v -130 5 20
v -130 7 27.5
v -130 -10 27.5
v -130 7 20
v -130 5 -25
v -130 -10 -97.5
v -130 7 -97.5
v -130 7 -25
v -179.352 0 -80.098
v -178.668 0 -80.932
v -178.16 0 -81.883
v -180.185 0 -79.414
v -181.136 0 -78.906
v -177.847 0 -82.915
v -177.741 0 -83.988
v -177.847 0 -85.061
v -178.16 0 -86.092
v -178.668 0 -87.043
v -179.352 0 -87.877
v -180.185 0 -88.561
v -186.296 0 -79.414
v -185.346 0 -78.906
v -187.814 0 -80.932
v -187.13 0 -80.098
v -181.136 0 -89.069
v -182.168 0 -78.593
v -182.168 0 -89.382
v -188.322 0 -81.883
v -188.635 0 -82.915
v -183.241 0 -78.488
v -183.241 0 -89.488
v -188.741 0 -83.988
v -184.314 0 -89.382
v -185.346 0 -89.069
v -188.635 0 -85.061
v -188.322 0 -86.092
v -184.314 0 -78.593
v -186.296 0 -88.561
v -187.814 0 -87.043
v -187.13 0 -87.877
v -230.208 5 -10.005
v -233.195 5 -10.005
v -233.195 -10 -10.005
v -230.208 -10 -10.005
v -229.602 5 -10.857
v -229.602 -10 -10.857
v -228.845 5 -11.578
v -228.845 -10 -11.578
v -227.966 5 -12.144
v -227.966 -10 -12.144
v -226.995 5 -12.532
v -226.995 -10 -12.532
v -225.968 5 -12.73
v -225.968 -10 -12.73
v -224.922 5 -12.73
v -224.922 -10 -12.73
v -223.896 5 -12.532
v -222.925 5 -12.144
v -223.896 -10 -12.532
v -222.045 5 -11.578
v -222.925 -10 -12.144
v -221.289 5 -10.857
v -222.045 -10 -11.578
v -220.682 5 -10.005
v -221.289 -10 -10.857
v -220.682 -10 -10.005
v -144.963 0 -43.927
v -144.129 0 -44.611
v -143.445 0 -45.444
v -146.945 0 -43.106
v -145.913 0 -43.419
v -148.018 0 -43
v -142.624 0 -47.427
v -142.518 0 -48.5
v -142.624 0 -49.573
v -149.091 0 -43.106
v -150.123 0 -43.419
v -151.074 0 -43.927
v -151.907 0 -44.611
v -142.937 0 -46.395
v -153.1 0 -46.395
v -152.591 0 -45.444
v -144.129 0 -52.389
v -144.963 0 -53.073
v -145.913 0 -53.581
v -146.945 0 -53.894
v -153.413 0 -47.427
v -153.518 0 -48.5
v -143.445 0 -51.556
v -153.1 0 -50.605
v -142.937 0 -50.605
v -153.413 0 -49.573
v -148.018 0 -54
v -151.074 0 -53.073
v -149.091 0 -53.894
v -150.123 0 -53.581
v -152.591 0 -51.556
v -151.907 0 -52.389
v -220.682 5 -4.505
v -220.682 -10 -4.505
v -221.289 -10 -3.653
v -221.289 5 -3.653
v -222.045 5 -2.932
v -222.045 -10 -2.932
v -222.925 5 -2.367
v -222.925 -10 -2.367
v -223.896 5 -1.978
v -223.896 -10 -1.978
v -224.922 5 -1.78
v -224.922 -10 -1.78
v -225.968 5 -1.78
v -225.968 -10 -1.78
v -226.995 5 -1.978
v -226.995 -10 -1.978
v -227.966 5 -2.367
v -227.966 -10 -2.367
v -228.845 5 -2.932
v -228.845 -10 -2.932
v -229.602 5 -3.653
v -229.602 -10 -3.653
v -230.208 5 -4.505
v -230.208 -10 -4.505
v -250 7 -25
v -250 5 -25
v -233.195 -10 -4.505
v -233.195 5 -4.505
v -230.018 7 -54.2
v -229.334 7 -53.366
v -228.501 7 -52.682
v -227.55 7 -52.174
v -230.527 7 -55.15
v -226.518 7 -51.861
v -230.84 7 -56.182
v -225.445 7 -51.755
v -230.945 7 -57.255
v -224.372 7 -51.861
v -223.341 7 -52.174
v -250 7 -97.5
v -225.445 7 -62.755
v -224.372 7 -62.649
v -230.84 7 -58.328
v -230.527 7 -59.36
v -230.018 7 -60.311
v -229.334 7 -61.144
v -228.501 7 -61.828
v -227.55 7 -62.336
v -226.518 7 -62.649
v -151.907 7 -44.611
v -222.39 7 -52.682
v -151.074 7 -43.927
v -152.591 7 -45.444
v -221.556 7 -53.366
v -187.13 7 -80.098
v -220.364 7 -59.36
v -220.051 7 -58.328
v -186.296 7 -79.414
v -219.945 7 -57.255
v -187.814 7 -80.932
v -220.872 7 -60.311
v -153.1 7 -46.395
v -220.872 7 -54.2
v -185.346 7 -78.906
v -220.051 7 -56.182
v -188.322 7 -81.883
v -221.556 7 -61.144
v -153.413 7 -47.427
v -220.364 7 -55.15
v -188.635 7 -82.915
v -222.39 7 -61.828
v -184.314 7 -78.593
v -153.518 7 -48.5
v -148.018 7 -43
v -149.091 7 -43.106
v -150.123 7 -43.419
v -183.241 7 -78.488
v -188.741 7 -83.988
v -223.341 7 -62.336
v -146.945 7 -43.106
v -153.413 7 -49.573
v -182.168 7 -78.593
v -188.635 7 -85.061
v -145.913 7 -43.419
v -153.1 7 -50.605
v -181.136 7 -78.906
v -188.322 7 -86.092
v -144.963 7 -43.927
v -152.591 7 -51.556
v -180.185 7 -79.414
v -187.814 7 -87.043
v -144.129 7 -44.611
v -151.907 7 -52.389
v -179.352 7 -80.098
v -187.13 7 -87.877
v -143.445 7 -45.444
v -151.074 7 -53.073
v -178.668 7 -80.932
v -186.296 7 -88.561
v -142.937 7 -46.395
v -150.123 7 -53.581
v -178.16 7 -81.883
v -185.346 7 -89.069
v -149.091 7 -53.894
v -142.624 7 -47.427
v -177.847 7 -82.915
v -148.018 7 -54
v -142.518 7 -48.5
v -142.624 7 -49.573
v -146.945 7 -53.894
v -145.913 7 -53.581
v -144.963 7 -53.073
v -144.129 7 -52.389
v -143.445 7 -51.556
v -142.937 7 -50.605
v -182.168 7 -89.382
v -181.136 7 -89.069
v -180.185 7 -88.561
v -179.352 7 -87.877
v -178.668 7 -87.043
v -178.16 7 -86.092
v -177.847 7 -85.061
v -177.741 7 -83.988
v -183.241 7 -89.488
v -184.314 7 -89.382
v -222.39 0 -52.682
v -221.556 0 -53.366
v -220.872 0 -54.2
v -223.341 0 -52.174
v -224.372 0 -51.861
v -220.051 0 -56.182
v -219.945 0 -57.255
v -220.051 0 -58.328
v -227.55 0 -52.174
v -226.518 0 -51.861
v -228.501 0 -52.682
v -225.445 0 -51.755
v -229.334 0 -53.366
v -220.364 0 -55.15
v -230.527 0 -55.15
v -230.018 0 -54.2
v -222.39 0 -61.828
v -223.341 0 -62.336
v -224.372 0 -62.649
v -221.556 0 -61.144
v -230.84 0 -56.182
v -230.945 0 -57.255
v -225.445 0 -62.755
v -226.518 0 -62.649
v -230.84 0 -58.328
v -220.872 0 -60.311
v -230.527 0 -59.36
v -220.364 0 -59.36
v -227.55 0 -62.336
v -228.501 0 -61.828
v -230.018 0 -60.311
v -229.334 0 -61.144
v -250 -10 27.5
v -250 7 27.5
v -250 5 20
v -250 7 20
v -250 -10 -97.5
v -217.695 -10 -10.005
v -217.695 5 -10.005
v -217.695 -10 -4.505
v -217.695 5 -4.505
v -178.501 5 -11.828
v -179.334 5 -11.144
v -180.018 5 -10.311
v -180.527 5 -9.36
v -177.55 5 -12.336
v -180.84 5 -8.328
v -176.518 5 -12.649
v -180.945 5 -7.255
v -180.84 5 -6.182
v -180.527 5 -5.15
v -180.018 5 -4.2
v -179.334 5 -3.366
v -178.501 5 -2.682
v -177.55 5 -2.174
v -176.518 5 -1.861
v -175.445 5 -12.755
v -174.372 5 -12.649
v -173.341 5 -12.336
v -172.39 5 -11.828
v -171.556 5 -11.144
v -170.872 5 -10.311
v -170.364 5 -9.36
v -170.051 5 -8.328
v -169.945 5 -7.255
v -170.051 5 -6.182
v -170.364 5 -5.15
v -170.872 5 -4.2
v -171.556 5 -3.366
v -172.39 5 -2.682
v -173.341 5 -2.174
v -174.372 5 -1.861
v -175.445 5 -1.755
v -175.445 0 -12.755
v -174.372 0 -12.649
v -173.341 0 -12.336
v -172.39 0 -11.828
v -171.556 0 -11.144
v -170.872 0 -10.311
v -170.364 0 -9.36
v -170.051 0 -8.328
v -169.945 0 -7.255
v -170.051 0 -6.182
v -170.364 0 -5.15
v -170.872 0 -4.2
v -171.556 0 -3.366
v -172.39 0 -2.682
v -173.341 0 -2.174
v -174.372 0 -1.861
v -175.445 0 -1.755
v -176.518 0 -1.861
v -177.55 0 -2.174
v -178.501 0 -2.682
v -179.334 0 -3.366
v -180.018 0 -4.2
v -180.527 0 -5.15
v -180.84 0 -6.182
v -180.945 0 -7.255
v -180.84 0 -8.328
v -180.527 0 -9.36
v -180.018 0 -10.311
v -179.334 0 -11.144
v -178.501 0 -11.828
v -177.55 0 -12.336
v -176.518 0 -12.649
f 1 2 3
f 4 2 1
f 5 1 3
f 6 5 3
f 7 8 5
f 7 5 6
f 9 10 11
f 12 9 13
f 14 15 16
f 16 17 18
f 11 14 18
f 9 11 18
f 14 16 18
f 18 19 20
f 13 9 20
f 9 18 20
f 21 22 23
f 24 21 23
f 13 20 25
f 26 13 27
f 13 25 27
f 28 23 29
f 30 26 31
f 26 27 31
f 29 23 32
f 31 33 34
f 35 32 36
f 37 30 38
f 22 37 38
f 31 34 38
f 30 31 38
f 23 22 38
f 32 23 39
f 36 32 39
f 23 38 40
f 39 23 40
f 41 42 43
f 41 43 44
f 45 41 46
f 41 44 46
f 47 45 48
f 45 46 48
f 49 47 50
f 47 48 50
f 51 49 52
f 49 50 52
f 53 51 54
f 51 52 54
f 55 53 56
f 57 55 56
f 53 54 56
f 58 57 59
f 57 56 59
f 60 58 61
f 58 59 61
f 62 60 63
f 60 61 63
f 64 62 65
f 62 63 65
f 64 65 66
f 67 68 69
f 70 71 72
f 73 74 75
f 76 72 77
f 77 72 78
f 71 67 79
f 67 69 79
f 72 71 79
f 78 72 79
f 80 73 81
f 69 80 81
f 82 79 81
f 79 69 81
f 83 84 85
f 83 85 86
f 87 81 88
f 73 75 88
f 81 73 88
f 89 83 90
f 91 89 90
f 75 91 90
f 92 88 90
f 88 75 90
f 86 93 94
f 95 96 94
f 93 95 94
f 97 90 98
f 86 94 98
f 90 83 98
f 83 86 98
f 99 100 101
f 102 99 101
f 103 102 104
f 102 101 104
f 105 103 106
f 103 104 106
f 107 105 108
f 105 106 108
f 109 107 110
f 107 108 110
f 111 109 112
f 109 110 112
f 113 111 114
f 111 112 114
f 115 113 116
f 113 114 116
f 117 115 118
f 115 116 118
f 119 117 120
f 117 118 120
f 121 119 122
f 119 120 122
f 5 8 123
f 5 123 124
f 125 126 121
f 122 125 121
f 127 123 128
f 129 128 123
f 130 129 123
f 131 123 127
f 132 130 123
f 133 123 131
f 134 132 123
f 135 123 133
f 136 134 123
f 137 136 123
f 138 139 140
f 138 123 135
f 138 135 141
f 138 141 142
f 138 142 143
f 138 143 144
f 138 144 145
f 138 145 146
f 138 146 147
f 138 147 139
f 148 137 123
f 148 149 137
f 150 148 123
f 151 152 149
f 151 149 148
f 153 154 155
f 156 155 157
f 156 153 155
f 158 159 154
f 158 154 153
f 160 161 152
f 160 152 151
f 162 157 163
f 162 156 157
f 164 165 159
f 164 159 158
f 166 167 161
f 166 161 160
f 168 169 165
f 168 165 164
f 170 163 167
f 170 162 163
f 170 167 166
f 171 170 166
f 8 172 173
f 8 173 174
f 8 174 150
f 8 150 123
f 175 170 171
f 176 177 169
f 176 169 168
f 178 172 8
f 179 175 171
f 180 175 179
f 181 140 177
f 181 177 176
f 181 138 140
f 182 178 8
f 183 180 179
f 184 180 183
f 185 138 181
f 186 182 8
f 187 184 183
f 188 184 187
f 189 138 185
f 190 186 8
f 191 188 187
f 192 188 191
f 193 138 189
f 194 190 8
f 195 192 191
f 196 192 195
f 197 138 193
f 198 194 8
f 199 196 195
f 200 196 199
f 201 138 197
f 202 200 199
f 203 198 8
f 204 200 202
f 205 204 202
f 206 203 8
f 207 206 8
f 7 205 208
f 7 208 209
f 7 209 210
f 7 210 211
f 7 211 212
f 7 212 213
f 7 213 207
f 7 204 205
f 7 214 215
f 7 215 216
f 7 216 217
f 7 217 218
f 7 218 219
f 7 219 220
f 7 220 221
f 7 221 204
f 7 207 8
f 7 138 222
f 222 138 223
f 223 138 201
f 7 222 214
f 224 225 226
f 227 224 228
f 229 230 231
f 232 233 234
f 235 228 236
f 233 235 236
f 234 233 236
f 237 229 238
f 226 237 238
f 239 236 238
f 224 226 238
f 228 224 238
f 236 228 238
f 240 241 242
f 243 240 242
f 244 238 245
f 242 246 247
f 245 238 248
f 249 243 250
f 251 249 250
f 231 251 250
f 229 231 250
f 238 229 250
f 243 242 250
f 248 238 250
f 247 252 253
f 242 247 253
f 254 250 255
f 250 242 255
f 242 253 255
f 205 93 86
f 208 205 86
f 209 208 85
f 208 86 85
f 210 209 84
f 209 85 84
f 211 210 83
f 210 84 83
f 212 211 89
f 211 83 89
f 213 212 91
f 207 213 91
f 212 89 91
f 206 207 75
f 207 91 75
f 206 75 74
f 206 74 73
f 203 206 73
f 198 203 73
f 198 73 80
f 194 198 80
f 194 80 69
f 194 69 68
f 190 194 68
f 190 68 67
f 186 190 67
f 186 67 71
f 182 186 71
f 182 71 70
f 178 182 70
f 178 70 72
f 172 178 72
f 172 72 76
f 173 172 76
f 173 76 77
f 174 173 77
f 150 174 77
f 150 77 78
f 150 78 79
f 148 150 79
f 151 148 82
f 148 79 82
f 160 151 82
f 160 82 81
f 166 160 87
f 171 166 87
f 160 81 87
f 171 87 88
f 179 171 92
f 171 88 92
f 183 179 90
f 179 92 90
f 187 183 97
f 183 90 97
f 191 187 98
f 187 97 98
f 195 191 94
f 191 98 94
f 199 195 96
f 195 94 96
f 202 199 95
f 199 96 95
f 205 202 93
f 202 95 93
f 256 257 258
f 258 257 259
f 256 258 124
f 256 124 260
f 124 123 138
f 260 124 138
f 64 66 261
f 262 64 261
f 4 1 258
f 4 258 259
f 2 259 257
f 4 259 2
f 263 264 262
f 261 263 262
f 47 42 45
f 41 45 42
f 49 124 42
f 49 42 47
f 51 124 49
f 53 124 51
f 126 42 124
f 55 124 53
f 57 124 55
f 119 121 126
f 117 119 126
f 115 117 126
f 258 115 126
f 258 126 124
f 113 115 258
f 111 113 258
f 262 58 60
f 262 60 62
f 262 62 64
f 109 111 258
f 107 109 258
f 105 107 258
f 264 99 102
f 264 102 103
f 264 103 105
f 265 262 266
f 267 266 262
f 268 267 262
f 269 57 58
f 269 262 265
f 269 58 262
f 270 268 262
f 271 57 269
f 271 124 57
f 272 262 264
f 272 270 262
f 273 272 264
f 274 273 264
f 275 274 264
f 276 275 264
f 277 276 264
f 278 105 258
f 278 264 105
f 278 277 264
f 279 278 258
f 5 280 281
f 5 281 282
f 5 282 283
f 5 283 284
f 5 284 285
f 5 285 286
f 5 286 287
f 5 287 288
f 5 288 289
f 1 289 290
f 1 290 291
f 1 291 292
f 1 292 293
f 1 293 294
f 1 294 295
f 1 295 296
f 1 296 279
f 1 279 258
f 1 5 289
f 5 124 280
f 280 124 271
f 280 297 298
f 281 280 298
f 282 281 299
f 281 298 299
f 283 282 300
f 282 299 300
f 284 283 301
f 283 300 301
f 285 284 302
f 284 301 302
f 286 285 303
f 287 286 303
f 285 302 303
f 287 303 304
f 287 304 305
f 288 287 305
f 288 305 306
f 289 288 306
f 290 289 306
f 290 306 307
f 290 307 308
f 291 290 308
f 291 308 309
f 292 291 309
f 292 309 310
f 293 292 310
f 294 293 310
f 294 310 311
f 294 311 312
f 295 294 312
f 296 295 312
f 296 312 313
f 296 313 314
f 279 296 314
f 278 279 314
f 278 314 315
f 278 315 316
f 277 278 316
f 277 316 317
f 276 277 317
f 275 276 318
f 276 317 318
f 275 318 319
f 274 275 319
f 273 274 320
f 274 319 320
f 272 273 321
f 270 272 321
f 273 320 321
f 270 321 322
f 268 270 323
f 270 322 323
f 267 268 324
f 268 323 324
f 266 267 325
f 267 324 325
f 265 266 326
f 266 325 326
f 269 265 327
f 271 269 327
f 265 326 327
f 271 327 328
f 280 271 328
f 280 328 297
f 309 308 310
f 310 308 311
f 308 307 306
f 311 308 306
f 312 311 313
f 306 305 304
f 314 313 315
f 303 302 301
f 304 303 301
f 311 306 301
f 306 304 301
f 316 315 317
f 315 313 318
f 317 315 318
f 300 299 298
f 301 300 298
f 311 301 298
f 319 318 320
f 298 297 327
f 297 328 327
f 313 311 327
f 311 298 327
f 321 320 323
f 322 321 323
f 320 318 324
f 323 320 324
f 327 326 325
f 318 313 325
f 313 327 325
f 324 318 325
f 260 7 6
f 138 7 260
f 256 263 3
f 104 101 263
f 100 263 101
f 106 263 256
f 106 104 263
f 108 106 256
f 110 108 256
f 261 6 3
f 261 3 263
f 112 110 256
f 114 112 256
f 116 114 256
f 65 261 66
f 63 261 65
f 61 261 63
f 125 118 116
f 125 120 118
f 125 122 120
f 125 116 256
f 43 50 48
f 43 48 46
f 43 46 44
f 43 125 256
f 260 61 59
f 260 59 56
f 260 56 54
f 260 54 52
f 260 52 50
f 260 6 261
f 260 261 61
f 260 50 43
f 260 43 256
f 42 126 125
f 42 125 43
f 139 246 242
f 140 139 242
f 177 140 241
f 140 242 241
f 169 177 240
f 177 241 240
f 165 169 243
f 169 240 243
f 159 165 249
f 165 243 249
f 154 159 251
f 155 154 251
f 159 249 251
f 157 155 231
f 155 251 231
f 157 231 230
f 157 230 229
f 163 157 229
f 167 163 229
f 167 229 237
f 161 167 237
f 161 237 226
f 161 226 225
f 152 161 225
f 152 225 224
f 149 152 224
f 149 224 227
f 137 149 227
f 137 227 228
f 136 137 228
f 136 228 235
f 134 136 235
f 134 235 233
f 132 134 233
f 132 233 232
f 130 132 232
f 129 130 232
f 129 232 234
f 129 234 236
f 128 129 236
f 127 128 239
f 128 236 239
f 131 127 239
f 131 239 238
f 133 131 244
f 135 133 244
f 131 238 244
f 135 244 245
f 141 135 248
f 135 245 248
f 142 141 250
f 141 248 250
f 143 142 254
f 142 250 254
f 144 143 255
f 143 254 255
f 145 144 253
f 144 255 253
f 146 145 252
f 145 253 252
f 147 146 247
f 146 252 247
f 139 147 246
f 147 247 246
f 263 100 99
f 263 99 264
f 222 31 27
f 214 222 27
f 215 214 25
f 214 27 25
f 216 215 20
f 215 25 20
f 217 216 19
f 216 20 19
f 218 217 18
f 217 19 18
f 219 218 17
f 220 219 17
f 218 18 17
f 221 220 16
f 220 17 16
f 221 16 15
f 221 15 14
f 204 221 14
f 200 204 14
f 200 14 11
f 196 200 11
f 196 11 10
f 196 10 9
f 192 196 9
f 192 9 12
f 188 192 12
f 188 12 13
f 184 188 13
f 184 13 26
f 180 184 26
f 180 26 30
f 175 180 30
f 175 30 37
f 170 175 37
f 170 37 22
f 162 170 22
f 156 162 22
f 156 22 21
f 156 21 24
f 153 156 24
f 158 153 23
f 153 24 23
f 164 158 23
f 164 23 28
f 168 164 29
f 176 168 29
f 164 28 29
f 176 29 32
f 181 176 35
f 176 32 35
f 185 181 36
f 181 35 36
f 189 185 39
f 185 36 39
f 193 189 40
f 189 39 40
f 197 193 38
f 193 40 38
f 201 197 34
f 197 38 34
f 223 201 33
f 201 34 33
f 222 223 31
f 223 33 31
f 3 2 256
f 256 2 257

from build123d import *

# Parameters (mm, degrees)
SKETCH1_W           = 120
SKETCH1_H           = 55
BOSS_EXTRUDE1_DEPTH = 5
SKETCH2_W           = 120
SKETCH2_H           = 7.5
BOSS_EXTRUDE2_DEPTH = 20
SKETCH3_W           = 120
SKETCH3_H           = 2.5
BOSS_EXTRUDE4_DEPTH = 20
BOSS_EXTRUDE5_DEPTH = 190
SKETCH9_W           = 310
SKETCH9_H           = 25
BOSS_EXTRUDE6_DEPTH = 70
SKETCH14_R          = 5.5
CUT_EXTRUDE5_DEPTH  = 153
SKETCH15_W          = 125
SKETCH15_H          = 25
CUT_EXTRUDE6_DEPTH  = 190
SKETCH16_W          = 120
SKETCH16_H          = 125
BOSS_EXTRUDE8_DEPTH = 10
SKETCH17_W          = 120
SKETCH17_H          = 125
CUT_EXTRUDE7_DEPTH  = 18
CUT_EXTRUDE8_START  = -31
SKETCH18_R          = 5.5
CUT_EXTRUDE8_DEPTH  = 31
SKETCH19_W          = 15.5
SKETCH19_H          = 5.5
CUT_EXTRUDE9_DEPTH  = 31


with BuildPart() as part:
    # Sketch1 → Boss-Extrude1 (new body)
    with BuildSketch(Plane(origin=(0, 0, 0), x_dir=(1, 0, 0), z_dir=(0, 1, 0))):
        Rectangle(SKETCH1_W, SKETCH1_H)
    extrude(amount=BOSS_EXTRUDE1_DEPTH)

    # Sketch2 → Boss-Extrude2 (add)
    with BuildSketch(Plane(origin=(0, 5, 0), x_dir=(1, 0, 0), z_dir=(0, 1, 0))):
        with Locations((0, -23.75)):
            Rectangle(SKETCH2_W, SKETCH2_H)
    extrude(amount=BOSS_EXTRUDE2_DEPTH)

    # Sketch3 → Boss-Extrude4 (add)
    with BuildSketch(Plane(origin=(0, 5, 0), x_dir=(1, 0, 0), z_dir=(0, 1, 0))):
        with Locations((0, 26.25)):
            Rectangle(SKETCH3_W, SKETCH3_H)
    extrude(amount=BOSS_EXTRUDE4_DEPTH)

    # Sketch8 → Boss-Extrude5 (add)
    with BuildSketch(Plane.ZY.offset(60)):
        Polygon((-27.5, 0), (-27.5, 25), (-25, 25), (-25, 5), (20, 5), (20, 25), (27.5, 25), (27.5, 0), align=None)
    extrude(amount=BOSS_EXTRUDE5_DEPTH)

    # Sketch9 → Boss-Extrude6 (add)
    with BuildSketch(Plane(origin=(0, 0, -27.5), x_dir=(-1, 0, 0), z_dir=(0, 0, -1))):
        with Locations((95, 12.5)):
            Rectangle(SKETCH9_W, SKETCH9_H)
    extrude(amount=BOSS_EXTRUDE6_DEPTH)

    # Sketch14 → Cut-Extrude5 (cut)
    with BuildSketch(Plane(origin=(0, 0, 0), x_dir=(-1, 0, 0), z_dir=(0, -1, 0))):
        with Locations(Location((225.445279058, 7.255161462, 0), (0, 0, 90))):
            Circle(SKETCH14_R)
        with Locations(Location((175.445279058, 7.255161462, 0), (0, 0, 90))):
            Circle(SKETCH14_R)
        with Locations(Location((225.445279058, 57.255161462, 0), (0, 0, 90))):
            Circle(SKETCH14_R)
        with Locations(Location((148.0182107, 48.5, 0), (0, 0, 90))):
            Circle(SKETCH14_R)
        with Locations(Location((183.240850763, 83.987541856, 0), (0, 0, 90))):
            Circle(SKETCH14_R)
    extrude(amount=-CUT_EXTRUDE5_DEPTH, mode=Mode.SUBTRACT)

    # Sketch15 → Cut-Extrude6 (cut)
    with BuildSketch(Plane(origin=(60, 0, 0), x_dir=(0, 0, -1), z_dir=(1, 0, 0))):
        with Locations((35, 12.5)):
            Rectangle(SKETCH15_W, SKETCH15_H)
    extrude(amount=-CUT_EXTRUDE6_DEPTH, mode=Mode.SUBTRACT)

    # Sketch16 → Boss-Extrude8 (add)
    with BuildSketch(Plane(origin=(0, 0, 0), x_dir=(-1, 0, 0), z_dir=(0, -1, 0))):
        with Locations((190, 35)):
            Rectangle(SKETCH16_W, SKETCH16_H)
    extrude(amount=BOSS_EXTRUDE8_DEPTH)

    # Sketch17 → Cut-Extrude7 (cut)
    with BuildSketch(Plane(origin=(0, 25, 0), x_dir=(1, 0, 0), z_dir=(0, 1, 0))):
        with Locations((-190, 35)):
            Rectangle(SKETCH17_W, SKETCH17_H)
    extrude(amount=-CUT_EXTRUDE7_DEPTH, mode=Mode.SUBTRACT)

    # Sketch18 → Cut-Extrude8 (cut)
    with BuildSketch(Plane(origin=(0, 5, 0), x_dir=(1, 0, 0), z_dir=(0, 1, 0)).offset(CUT_EXTRUDE8_START)):
        with Locations(Location((-225.445279058, 7.255161462, 0), (0, 0, 90))):
            Circle(SKETCH18_R)
    extrude(amount=CUT_EXTRUDE8_DEPTH, mode=Mode.SUBTRACT)

    # Sketch19 → Cut-Extrude9 (cut)
    with BuildSketch(Plane(origin=(0, 5, 0), x_dir=(1, 0, 0), z_dir=(0, 1, 0))):
        with Locations((-225.445279058, 7.255161462)):
            Rectangle(SKETCH19_W, SKETCH19_H)
    extrude(amount=-CUT_EXTRUDE9_DEPTH, mode=Mode.SUBTRACT)


solid = part.part
